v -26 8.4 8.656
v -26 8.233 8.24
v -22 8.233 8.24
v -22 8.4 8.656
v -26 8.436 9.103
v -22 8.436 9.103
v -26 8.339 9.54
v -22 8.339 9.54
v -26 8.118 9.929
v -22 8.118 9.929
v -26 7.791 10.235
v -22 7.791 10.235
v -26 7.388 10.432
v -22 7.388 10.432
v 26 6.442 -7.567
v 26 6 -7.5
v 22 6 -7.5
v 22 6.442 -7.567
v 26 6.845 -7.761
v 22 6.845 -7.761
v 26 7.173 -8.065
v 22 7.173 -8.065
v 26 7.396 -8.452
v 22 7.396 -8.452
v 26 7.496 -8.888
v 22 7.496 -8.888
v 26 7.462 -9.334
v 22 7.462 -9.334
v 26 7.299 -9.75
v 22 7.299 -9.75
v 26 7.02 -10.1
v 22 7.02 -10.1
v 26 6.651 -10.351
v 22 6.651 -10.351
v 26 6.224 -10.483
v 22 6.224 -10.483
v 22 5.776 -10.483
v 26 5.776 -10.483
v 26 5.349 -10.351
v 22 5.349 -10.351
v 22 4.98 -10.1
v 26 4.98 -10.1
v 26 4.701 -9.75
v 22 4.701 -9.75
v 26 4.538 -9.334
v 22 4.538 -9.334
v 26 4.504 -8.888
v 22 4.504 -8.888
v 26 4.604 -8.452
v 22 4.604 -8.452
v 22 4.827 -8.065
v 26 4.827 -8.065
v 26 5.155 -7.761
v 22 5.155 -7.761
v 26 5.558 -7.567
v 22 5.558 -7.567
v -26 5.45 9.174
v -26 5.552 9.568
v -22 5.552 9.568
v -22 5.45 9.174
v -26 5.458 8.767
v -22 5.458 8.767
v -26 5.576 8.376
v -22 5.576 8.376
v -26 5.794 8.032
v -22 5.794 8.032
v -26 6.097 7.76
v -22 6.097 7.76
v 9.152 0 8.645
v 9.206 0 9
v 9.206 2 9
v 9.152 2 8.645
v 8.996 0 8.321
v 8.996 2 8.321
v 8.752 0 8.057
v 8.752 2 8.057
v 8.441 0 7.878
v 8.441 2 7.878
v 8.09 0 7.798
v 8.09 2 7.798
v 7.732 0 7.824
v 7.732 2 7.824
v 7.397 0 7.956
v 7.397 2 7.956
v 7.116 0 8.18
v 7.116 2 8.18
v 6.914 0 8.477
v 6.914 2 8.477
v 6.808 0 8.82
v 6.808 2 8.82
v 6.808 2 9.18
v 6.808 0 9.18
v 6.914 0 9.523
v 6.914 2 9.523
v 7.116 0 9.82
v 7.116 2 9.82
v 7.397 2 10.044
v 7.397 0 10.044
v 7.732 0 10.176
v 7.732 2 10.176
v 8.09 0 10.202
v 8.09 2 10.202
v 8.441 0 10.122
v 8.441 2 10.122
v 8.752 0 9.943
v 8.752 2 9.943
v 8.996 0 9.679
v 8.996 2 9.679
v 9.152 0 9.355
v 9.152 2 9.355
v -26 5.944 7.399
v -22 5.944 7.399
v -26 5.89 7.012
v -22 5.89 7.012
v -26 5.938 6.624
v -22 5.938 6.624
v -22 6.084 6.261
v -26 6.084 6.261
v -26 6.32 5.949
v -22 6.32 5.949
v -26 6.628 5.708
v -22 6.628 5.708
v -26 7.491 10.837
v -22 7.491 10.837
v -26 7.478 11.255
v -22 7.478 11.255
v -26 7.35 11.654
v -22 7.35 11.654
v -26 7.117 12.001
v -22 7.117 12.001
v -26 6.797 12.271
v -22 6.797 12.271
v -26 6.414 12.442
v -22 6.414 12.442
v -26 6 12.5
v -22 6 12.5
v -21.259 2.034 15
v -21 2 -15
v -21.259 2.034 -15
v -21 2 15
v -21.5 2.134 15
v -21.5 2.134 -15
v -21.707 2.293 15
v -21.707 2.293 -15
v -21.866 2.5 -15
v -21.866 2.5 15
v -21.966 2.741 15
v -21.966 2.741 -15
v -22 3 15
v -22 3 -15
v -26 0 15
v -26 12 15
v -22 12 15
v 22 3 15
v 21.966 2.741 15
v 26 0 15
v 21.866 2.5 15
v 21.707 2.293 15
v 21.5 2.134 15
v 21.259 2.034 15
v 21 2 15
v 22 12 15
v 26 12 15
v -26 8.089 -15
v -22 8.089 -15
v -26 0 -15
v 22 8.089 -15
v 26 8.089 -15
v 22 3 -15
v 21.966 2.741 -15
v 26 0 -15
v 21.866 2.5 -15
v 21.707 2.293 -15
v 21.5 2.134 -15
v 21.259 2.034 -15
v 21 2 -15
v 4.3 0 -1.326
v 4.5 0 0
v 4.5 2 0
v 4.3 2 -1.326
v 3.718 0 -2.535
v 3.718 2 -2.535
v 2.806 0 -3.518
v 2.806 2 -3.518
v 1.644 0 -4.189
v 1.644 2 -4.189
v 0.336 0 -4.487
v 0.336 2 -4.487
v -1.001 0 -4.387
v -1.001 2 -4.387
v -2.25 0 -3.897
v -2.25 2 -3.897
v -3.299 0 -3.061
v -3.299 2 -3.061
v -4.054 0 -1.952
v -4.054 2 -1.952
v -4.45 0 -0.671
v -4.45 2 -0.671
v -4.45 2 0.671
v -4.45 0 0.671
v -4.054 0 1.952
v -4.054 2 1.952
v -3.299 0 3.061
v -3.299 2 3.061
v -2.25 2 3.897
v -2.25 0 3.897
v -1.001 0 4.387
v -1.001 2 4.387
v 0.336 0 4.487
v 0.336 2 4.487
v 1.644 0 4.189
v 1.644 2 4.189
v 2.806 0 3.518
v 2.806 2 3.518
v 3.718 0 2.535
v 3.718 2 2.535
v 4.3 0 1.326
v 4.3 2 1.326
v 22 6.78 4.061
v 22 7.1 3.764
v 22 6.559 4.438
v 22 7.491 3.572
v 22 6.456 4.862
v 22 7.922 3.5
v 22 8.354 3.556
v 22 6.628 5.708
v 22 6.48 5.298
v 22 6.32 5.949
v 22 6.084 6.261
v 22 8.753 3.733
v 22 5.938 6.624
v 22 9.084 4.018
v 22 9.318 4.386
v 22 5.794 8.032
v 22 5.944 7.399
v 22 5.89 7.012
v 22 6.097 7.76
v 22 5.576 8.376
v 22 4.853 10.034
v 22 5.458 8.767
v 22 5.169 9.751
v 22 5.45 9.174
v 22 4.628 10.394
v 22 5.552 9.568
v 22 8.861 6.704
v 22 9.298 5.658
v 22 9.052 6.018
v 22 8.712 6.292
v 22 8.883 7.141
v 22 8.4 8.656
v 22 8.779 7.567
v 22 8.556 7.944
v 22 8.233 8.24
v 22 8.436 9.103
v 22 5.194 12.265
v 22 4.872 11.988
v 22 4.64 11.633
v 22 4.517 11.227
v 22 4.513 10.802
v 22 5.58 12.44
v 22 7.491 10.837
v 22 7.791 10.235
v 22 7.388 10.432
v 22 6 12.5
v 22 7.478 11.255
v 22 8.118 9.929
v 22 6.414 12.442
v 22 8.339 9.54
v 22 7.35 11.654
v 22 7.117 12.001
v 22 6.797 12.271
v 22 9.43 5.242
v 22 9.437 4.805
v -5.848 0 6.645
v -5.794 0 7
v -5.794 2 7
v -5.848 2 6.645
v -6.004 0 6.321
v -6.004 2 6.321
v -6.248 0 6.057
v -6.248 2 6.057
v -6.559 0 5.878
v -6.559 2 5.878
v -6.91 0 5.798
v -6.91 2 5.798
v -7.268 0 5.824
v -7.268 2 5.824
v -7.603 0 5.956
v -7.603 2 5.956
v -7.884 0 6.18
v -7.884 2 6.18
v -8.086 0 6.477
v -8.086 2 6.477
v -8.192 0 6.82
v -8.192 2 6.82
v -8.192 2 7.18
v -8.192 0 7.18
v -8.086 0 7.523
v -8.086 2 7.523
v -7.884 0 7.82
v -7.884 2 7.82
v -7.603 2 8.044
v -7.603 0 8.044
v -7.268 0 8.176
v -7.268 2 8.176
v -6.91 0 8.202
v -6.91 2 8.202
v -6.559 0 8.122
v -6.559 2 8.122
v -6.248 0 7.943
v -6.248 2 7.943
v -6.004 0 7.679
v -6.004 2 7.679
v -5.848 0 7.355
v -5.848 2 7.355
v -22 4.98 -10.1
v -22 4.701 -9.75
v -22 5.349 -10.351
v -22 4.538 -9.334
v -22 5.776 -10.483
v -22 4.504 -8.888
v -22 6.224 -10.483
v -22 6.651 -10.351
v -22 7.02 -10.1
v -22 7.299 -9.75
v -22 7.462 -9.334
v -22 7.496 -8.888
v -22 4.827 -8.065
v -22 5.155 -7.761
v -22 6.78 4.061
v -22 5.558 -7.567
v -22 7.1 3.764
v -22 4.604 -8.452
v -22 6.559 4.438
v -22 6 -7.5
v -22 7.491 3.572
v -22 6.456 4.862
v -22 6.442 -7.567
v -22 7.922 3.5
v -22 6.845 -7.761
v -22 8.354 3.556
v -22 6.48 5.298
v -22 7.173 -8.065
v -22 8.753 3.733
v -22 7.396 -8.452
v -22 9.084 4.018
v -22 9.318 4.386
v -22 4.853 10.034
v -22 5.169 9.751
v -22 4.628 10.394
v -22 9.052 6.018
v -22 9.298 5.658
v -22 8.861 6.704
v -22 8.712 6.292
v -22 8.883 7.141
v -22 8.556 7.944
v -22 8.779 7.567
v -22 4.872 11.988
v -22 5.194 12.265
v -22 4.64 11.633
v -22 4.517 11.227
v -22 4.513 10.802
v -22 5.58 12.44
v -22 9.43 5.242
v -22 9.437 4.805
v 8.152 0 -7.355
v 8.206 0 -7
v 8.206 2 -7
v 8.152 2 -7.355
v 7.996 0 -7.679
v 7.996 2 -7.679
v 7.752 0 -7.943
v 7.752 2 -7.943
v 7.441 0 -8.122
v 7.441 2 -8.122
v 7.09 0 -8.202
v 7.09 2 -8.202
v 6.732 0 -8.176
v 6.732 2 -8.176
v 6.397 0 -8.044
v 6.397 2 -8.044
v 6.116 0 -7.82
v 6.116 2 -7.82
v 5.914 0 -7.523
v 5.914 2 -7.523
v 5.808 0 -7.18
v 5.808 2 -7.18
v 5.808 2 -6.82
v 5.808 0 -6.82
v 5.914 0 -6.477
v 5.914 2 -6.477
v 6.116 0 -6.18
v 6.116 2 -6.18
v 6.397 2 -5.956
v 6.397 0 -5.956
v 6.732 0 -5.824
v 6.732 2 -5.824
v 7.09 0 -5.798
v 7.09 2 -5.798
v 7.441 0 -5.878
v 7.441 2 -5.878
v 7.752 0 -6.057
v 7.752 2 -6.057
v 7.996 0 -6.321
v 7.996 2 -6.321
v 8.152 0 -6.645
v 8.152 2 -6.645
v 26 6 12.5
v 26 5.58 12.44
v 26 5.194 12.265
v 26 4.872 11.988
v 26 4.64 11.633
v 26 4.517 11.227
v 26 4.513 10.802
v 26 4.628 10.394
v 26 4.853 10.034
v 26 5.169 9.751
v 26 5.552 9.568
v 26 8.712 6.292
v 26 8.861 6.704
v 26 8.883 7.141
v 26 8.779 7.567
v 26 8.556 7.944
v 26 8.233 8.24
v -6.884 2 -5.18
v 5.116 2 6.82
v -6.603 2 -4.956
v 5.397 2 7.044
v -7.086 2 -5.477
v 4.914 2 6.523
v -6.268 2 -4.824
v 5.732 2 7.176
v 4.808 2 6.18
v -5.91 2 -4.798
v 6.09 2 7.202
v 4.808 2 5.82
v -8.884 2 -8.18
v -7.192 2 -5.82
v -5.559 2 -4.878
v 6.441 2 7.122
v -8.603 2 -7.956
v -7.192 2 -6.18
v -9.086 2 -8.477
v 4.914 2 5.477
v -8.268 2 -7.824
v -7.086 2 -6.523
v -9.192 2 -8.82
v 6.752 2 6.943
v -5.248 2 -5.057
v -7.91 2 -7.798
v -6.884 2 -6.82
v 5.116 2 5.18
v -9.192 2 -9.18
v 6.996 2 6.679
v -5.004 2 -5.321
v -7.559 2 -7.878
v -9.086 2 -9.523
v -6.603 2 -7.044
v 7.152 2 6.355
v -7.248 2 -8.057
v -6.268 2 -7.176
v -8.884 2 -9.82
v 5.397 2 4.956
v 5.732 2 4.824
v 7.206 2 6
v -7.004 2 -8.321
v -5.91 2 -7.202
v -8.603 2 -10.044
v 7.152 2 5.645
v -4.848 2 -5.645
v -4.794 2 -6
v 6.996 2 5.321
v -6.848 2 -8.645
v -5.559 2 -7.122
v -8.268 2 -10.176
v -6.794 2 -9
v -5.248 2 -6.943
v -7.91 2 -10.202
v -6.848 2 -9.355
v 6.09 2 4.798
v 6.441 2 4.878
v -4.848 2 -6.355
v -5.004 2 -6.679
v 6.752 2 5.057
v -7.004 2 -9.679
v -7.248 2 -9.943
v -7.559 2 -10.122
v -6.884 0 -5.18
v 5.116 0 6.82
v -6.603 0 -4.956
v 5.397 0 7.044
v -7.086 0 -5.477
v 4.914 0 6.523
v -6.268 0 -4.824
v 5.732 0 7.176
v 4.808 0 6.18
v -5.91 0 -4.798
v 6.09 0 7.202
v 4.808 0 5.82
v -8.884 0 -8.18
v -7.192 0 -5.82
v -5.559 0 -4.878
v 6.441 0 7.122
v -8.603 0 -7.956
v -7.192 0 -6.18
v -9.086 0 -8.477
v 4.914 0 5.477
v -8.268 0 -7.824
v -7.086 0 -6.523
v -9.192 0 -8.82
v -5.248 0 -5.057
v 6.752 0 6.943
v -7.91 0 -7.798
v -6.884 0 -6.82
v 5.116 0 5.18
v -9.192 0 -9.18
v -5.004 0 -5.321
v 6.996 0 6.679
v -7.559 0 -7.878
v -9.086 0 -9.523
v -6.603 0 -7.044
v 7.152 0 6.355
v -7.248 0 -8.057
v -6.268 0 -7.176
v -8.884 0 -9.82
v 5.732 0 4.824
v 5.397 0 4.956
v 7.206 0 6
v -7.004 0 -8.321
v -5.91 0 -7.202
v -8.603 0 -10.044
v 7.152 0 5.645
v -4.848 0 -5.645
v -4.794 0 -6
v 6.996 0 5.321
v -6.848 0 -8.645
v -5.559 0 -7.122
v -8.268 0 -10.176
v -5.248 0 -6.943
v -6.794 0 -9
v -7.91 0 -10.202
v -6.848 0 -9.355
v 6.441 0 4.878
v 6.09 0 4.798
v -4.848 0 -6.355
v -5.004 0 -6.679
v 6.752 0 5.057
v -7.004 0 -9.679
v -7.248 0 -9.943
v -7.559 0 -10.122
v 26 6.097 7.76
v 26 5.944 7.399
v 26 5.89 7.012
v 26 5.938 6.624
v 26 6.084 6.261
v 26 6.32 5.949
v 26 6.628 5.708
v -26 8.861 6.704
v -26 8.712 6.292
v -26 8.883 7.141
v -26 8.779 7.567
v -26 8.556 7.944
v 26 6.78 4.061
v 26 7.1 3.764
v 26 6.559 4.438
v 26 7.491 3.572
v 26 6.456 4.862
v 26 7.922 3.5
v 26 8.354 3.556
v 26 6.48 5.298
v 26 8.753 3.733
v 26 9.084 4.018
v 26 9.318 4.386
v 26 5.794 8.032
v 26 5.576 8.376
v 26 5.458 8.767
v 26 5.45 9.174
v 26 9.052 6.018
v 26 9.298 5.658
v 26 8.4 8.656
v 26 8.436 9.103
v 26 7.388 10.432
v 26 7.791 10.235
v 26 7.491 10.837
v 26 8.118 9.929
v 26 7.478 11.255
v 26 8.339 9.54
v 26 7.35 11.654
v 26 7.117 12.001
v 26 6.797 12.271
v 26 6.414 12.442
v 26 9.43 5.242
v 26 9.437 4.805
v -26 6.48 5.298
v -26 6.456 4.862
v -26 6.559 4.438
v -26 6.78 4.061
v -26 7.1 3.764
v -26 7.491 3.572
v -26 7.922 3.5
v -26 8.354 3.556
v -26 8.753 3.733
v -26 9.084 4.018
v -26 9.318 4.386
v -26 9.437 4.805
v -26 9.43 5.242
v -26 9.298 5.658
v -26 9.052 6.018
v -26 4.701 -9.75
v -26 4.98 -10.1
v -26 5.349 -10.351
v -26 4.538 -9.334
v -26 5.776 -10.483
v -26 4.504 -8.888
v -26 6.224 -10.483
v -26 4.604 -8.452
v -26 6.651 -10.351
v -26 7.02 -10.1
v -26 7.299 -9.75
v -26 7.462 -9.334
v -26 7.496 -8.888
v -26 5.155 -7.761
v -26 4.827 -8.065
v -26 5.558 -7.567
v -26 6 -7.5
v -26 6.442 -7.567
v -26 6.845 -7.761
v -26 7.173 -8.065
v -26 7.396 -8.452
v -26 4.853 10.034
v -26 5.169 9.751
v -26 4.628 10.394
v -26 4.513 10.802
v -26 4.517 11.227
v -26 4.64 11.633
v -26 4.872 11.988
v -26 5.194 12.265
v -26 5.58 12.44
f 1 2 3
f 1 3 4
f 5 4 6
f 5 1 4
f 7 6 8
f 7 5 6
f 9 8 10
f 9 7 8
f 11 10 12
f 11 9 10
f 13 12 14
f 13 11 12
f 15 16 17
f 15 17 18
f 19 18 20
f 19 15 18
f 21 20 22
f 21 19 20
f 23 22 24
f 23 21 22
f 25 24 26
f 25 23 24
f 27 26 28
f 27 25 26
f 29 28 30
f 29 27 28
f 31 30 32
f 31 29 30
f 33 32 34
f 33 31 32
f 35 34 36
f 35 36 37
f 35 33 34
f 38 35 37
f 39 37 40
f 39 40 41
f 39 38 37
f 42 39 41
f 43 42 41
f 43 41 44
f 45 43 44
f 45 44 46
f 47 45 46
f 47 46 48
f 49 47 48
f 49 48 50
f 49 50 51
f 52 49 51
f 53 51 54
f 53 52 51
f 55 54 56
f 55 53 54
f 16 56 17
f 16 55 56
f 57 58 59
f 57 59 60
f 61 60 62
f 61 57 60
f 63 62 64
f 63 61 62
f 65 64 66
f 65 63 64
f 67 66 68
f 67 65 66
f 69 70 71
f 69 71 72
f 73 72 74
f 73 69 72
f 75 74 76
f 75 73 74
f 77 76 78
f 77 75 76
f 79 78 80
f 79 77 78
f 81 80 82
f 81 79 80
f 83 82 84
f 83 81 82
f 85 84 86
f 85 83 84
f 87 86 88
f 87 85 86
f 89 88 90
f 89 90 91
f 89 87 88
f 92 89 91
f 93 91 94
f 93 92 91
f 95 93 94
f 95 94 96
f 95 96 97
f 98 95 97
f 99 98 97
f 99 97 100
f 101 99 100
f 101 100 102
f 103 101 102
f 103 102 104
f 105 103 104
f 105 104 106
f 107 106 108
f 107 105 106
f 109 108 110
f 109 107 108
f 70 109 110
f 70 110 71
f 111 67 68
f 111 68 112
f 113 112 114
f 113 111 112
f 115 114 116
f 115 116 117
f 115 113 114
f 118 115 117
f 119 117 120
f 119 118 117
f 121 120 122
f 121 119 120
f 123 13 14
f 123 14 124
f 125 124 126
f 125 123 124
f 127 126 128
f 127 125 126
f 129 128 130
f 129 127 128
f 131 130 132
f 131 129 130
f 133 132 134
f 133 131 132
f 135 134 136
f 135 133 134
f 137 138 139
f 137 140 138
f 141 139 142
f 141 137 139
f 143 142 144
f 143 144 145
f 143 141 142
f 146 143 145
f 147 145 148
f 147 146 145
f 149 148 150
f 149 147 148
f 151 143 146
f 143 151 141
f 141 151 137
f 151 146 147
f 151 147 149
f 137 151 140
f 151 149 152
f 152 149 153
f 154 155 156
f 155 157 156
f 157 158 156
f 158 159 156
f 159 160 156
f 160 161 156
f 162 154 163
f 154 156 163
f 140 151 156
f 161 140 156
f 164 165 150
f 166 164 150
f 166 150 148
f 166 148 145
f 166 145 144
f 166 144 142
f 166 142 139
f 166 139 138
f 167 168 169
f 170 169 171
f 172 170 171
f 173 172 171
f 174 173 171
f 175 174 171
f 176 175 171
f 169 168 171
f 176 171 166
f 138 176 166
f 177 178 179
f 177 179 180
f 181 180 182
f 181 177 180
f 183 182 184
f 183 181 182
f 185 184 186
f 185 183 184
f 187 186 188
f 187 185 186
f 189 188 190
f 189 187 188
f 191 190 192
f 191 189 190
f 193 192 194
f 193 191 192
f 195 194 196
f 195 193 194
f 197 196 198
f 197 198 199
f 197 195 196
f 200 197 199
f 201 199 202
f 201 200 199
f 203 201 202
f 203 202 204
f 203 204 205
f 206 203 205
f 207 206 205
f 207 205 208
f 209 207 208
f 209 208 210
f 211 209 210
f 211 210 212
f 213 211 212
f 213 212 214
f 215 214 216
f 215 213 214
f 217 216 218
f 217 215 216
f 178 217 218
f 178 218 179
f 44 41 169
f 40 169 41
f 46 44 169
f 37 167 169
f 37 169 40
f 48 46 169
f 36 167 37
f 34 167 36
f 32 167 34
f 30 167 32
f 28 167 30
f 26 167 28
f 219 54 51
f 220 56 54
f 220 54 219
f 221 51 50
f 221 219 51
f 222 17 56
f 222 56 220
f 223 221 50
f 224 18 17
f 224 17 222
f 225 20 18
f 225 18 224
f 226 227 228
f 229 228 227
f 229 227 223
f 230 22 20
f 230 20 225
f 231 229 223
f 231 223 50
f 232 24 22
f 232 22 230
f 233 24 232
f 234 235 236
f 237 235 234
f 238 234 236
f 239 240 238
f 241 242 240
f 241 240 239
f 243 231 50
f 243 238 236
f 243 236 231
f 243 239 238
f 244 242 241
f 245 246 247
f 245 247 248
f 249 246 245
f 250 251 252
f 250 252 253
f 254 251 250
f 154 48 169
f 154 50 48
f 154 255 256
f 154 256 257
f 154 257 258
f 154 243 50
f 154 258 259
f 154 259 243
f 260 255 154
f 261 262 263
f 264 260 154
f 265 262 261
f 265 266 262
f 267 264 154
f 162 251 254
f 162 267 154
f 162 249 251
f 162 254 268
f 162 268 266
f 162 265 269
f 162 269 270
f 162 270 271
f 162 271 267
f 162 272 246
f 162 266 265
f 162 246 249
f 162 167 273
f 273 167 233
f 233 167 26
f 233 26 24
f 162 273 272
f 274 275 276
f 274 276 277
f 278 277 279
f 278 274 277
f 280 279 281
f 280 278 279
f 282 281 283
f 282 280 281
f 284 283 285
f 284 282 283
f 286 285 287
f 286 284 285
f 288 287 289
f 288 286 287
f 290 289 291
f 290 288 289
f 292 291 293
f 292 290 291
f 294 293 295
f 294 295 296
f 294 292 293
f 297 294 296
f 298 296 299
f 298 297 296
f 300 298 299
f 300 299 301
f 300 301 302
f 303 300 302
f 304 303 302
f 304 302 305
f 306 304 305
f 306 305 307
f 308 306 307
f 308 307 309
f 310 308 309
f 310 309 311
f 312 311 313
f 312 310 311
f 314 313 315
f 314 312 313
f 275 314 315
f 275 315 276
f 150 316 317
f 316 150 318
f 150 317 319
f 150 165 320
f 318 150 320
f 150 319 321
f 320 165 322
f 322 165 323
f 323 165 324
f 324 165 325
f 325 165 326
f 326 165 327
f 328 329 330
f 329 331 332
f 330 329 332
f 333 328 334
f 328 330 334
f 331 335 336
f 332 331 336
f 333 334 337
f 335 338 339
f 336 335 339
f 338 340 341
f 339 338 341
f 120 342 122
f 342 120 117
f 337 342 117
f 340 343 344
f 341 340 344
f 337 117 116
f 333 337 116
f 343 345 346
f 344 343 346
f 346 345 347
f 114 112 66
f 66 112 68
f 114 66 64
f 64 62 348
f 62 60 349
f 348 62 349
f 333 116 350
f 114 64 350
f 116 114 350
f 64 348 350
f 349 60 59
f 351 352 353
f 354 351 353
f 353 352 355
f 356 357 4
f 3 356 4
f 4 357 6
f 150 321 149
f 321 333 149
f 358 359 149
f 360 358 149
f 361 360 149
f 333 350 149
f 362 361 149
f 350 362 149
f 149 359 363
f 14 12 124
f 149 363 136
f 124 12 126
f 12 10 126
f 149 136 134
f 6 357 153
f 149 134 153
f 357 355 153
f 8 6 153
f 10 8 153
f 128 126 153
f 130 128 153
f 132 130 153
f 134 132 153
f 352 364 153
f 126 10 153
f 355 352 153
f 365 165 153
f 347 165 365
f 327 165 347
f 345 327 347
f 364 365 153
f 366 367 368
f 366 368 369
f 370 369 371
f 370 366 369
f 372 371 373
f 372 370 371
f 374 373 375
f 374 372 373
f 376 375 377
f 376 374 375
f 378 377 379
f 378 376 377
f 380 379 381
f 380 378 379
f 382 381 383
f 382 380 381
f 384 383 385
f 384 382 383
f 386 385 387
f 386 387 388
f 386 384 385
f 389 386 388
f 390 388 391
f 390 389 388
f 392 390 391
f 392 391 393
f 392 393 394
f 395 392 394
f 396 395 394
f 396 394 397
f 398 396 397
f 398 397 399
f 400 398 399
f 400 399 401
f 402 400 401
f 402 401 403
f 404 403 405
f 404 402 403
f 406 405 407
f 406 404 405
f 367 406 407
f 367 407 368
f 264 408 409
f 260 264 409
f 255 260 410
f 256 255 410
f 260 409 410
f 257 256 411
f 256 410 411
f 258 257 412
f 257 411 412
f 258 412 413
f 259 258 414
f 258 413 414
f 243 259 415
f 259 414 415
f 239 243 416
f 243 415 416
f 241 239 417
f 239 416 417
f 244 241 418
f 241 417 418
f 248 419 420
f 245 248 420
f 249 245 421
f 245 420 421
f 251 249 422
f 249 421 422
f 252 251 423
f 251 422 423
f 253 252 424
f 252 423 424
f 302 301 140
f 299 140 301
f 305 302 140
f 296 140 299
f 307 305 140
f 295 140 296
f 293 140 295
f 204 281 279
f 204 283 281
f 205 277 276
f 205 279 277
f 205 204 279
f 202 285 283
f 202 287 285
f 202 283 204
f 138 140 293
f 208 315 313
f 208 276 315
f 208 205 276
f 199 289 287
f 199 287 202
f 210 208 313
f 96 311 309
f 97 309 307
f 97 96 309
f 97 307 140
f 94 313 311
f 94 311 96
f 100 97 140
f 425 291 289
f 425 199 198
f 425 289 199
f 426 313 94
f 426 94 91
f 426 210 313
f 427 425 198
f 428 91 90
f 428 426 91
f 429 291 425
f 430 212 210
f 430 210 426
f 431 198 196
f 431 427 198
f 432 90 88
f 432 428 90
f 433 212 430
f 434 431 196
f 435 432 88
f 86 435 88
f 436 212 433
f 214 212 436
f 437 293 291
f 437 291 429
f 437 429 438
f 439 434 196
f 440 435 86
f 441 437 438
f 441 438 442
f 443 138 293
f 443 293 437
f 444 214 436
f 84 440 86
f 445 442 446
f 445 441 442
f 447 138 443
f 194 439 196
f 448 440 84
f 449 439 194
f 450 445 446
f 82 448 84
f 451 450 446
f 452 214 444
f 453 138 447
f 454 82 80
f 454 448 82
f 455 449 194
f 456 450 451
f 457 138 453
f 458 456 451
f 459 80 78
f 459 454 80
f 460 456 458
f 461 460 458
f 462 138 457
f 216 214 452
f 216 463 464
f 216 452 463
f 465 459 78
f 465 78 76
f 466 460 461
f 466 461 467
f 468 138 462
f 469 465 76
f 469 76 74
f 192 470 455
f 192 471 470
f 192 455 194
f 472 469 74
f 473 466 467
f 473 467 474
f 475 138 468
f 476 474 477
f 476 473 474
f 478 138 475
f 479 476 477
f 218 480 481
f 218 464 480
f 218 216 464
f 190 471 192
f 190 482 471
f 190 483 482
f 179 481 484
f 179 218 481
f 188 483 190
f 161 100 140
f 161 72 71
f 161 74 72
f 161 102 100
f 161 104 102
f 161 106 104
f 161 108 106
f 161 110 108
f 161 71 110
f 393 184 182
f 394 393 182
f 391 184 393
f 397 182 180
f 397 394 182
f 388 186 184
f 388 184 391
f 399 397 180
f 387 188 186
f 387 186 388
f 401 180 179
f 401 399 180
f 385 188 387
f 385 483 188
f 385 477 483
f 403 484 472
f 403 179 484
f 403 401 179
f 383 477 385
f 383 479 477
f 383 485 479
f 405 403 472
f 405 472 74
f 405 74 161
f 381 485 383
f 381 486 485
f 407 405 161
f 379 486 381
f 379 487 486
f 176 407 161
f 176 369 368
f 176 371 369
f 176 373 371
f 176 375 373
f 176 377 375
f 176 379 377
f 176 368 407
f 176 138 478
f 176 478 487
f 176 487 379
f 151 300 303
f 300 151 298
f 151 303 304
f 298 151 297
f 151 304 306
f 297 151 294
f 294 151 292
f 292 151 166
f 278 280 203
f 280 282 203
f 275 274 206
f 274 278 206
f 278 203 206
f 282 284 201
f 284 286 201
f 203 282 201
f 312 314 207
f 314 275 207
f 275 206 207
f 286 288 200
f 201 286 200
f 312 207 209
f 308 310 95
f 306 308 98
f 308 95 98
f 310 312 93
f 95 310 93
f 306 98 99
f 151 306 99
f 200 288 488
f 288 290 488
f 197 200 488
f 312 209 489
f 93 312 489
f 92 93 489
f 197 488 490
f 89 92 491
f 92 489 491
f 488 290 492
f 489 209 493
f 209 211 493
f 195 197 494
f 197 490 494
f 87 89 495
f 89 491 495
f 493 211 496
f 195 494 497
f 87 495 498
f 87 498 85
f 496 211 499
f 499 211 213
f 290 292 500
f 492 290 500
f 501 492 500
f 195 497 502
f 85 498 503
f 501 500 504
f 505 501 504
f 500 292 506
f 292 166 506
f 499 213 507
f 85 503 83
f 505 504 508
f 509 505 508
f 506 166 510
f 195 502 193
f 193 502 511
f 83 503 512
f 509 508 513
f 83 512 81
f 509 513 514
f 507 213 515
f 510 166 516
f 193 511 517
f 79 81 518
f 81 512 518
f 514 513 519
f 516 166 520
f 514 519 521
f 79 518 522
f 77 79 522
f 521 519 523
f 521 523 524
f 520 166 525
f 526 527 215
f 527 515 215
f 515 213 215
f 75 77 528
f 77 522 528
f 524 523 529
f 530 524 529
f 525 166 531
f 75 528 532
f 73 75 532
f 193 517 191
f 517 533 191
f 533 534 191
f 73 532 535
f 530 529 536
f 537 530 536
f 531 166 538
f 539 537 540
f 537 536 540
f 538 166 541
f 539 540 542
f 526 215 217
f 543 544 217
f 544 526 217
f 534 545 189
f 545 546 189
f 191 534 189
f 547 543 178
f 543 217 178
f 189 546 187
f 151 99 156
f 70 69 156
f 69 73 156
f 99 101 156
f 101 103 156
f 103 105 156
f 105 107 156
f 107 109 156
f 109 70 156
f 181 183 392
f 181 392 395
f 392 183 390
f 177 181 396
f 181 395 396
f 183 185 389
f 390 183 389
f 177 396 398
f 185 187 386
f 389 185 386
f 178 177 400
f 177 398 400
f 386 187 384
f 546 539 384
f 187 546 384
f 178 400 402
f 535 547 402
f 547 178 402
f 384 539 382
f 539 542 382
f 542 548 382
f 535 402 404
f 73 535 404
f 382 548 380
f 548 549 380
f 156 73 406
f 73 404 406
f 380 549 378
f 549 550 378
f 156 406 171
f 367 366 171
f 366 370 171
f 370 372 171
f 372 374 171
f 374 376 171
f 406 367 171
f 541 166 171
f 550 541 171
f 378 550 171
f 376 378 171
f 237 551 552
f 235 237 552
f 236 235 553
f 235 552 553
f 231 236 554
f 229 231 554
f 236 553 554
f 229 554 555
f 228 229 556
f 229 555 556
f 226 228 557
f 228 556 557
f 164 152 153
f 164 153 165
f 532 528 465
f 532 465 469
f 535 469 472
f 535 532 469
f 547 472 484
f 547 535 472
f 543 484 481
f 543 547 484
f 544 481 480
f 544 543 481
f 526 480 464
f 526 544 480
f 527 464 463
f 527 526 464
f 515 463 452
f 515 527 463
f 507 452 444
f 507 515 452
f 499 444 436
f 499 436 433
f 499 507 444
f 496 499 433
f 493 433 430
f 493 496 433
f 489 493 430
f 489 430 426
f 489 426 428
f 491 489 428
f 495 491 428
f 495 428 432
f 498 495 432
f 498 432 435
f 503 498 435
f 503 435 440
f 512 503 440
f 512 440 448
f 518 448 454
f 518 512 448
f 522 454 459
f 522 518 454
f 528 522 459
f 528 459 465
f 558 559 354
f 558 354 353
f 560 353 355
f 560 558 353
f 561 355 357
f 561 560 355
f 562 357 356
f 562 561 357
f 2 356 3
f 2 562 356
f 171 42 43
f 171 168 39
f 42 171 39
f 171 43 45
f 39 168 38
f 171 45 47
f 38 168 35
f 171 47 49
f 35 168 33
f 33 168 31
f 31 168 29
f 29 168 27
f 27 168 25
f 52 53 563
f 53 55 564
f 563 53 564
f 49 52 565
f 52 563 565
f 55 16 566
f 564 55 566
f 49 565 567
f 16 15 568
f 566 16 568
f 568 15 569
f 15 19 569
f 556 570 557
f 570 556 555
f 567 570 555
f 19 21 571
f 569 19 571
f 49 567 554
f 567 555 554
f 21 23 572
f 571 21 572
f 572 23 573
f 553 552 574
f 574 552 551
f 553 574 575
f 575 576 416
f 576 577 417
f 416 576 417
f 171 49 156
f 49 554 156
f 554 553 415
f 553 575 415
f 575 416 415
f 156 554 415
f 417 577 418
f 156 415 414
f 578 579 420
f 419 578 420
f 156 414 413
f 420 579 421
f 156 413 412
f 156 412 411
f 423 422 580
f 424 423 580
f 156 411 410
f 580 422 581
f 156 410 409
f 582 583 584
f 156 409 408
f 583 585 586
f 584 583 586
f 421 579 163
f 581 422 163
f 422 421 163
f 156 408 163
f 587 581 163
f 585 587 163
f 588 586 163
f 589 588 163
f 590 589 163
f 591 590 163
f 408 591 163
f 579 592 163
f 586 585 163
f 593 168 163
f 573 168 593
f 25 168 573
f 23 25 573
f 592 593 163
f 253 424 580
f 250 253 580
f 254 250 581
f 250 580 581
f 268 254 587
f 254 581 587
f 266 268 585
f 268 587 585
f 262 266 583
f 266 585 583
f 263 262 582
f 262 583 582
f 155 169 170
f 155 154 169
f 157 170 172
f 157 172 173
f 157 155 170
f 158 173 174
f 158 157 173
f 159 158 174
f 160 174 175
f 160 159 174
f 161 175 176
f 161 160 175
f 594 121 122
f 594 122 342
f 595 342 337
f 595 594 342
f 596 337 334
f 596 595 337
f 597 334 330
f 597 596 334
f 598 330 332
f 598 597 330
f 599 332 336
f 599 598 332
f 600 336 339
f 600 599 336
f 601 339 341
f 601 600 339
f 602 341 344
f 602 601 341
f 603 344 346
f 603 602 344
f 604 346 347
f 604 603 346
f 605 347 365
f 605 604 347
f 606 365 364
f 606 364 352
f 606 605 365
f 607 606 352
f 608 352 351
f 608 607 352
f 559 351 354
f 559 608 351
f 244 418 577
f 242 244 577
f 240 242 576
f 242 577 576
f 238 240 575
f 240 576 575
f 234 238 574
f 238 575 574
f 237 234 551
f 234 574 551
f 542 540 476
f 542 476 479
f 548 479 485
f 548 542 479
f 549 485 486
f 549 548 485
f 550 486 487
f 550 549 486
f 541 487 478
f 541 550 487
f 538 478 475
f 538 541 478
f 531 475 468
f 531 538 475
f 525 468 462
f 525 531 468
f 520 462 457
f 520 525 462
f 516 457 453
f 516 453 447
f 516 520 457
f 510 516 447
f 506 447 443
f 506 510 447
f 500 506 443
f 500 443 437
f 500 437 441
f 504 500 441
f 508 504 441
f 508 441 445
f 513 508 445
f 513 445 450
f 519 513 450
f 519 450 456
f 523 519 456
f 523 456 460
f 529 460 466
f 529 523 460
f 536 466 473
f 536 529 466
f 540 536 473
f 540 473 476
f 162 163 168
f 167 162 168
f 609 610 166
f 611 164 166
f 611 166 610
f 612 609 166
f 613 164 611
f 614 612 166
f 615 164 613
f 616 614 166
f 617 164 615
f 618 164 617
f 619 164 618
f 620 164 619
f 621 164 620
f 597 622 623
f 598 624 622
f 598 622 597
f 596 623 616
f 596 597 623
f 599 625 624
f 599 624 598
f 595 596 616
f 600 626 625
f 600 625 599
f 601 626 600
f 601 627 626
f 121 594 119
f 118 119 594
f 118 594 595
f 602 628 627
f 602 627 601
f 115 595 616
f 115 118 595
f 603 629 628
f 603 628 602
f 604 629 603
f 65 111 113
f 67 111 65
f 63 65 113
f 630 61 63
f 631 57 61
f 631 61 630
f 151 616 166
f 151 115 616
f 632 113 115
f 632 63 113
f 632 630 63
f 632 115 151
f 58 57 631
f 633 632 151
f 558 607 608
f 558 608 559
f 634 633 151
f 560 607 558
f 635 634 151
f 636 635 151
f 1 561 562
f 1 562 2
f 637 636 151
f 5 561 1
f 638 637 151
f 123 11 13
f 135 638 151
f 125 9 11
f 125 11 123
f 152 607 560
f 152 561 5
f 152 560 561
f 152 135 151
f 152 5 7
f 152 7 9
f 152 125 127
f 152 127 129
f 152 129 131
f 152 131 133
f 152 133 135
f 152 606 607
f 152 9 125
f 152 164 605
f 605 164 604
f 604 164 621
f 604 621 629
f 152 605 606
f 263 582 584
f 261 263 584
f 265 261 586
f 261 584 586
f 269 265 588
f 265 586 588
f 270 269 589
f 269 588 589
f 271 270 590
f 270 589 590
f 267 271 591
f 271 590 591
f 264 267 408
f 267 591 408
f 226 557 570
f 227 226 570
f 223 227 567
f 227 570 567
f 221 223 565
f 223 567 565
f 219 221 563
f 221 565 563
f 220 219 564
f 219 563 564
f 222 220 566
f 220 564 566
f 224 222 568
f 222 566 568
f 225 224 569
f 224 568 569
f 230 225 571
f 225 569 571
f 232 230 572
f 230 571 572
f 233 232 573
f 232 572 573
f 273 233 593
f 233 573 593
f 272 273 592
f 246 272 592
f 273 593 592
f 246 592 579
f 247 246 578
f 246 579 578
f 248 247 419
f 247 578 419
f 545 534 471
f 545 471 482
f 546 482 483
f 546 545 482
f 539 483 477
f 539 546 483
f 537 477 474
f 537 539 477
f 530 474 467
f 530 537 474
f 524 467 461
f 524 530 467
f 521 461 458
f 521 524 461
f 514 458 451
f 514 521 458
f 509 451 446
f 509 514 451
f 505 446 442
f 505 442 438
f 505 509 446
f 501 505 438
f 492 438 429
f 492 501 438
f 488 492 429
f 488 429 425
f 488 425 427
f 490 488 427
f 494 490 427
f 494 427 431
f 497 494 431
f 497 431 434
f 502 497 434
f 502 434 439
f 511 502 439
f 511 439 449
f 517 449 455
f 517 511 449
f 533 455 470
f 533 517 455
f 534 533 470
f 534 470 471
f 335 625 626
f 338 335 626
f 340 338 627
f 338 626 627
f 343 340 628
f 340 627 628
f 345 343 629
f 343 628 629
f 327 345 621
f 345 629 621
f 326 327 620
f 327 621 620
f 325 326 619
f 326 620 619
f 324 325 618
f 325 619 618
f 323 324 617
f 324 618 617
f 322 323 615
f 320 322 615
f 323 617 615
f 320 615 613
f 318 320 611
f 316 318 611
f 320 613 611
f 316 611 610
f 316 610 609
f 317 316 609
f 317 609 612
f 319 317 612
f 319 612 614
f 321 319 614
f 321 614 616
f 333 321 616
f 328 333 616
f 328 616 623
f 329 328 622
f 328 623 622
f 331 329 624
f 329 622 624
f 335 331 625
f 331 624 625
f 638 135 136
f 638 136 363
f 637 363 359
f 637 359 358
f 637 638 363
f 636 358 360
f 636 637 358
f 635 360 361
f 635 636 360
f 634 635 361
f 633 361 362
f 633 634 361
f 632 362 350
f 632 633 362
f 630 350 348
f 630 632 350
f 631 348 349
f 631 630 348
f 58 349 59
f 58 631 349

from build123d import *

# Parameters (mm, degrees)
ESBO_O1_W                = 52
ESBO_O1_H                = 30
ESBO_O1_R                = 4.5
ESBO_O1_R_2              = 1.205837633
RESSALTO_EXTRUS_O1_DEPTH = 2
ESBO_O2_R                = 1.5
RESSALTO_EXTRUS_O2_DEPTH = 4
FILETE3_R                = 1


with BuildPart() as part:
    # Esboço1 → Ressalto-extrusão1 (new body)
    with BuildSketch(Plane(origin=(0, 0, 0), x_dir=(1, 0, 0), z_dir=(0, 1, 0))):
        Rectangle(ESBO_O1_W, ESBO_O1_H)
        Circle(ESBO_O1_R, mode=Mode.SUBTRACT)
        with Locations((7, 7)):
            Circle(ESBO_O1_R_2, mode=Mode.SUBTRACT)
        with Locations((-6, 6)):
            Circle(ESBO_O1_R_2, mode=Mode.SUBTRACT)
        with Locations((-8, 9)):
            Circle(ESBO_O1_R_2, mode=Mode.SUBTRACT)
        with Locations((-7, -7)):
            Circle(ESBO_O1_R_2, mode=Mode.SUBTRACT)
        with Locations((6, -6)):
            Circle(ESBO_O1_R_2, mode=Mode.SUBTRACT)
        with Locations((8, -9)):
            Circle(ESBO_O1_R_2, mode=Mode.SUBTRACT)
    extrude(amount=RESSALTO_EXTRUS_O1_DEPTH)

    # Esboço2 → Ressalto-extrusão2 (add)
    with BuildSketch(Plane.ZY.offset(26)):
        Polygon((15, 2), (15, 12), (-15, 8.089445099), (-15, 2), align=None)
        with Locations((-9, 6)):
            Circle(ESBO_O2_R, mode=Mode.SUBTRACT)
        with BuildLine():
            ThreePointArc((8.240400933, 8.233448591), (9.539925295, 8.339457279), (10.431505763, 7.388097368))
            ThreePointArc((10.431505763, 7.388097368), (11.835840488, 7.245540316), (12.5, 6))
            ThreePointArc((12.5, 6), (11.226651005, 4.51722243), (9.568494237, 5.551902632))
            ThreePointArc((9.568494237, 5.551902632), (8.567535869, 5.503694052), (7.759599067, 6.096551409))
            ThreePointArc((7.759599067, 6.096551409), (6.624037685, 5.937880054), (5.708151293, 6.62768319))
            ThreePointArc((5.708151293, 6.62768319), (3.55555397, 8.354444888), (6.291848707, 8.71231681))
            ThreePointArc((6.291848707, 8.71231681), (7.357982, 8.84665675), (8.240400933, 8.233448591))
        make_face(mode=Mode.SUBTRACT)
    ressalto_extrus_o2 = extrude(amount=-RESSALTO_EXTRUS_O2_DEPTH)

    # Espelhar1: Ressalto-extrusão2 across plane
    add(ressalto_extrus_o2.mirror(Plane(origin=(0, 0, 0), x_dir=(0, 0, 1), z_dir=(1, 0, 0))))

    # Filete3
    filete3_edges = [part.edges().sort_by_distance(p)[0] for p in [
        (22, 2, 0),
        (-22, 2, 0),
    ]]
    fillet(filete3_edges, radius=FILETE3_R)


solid = part.part
